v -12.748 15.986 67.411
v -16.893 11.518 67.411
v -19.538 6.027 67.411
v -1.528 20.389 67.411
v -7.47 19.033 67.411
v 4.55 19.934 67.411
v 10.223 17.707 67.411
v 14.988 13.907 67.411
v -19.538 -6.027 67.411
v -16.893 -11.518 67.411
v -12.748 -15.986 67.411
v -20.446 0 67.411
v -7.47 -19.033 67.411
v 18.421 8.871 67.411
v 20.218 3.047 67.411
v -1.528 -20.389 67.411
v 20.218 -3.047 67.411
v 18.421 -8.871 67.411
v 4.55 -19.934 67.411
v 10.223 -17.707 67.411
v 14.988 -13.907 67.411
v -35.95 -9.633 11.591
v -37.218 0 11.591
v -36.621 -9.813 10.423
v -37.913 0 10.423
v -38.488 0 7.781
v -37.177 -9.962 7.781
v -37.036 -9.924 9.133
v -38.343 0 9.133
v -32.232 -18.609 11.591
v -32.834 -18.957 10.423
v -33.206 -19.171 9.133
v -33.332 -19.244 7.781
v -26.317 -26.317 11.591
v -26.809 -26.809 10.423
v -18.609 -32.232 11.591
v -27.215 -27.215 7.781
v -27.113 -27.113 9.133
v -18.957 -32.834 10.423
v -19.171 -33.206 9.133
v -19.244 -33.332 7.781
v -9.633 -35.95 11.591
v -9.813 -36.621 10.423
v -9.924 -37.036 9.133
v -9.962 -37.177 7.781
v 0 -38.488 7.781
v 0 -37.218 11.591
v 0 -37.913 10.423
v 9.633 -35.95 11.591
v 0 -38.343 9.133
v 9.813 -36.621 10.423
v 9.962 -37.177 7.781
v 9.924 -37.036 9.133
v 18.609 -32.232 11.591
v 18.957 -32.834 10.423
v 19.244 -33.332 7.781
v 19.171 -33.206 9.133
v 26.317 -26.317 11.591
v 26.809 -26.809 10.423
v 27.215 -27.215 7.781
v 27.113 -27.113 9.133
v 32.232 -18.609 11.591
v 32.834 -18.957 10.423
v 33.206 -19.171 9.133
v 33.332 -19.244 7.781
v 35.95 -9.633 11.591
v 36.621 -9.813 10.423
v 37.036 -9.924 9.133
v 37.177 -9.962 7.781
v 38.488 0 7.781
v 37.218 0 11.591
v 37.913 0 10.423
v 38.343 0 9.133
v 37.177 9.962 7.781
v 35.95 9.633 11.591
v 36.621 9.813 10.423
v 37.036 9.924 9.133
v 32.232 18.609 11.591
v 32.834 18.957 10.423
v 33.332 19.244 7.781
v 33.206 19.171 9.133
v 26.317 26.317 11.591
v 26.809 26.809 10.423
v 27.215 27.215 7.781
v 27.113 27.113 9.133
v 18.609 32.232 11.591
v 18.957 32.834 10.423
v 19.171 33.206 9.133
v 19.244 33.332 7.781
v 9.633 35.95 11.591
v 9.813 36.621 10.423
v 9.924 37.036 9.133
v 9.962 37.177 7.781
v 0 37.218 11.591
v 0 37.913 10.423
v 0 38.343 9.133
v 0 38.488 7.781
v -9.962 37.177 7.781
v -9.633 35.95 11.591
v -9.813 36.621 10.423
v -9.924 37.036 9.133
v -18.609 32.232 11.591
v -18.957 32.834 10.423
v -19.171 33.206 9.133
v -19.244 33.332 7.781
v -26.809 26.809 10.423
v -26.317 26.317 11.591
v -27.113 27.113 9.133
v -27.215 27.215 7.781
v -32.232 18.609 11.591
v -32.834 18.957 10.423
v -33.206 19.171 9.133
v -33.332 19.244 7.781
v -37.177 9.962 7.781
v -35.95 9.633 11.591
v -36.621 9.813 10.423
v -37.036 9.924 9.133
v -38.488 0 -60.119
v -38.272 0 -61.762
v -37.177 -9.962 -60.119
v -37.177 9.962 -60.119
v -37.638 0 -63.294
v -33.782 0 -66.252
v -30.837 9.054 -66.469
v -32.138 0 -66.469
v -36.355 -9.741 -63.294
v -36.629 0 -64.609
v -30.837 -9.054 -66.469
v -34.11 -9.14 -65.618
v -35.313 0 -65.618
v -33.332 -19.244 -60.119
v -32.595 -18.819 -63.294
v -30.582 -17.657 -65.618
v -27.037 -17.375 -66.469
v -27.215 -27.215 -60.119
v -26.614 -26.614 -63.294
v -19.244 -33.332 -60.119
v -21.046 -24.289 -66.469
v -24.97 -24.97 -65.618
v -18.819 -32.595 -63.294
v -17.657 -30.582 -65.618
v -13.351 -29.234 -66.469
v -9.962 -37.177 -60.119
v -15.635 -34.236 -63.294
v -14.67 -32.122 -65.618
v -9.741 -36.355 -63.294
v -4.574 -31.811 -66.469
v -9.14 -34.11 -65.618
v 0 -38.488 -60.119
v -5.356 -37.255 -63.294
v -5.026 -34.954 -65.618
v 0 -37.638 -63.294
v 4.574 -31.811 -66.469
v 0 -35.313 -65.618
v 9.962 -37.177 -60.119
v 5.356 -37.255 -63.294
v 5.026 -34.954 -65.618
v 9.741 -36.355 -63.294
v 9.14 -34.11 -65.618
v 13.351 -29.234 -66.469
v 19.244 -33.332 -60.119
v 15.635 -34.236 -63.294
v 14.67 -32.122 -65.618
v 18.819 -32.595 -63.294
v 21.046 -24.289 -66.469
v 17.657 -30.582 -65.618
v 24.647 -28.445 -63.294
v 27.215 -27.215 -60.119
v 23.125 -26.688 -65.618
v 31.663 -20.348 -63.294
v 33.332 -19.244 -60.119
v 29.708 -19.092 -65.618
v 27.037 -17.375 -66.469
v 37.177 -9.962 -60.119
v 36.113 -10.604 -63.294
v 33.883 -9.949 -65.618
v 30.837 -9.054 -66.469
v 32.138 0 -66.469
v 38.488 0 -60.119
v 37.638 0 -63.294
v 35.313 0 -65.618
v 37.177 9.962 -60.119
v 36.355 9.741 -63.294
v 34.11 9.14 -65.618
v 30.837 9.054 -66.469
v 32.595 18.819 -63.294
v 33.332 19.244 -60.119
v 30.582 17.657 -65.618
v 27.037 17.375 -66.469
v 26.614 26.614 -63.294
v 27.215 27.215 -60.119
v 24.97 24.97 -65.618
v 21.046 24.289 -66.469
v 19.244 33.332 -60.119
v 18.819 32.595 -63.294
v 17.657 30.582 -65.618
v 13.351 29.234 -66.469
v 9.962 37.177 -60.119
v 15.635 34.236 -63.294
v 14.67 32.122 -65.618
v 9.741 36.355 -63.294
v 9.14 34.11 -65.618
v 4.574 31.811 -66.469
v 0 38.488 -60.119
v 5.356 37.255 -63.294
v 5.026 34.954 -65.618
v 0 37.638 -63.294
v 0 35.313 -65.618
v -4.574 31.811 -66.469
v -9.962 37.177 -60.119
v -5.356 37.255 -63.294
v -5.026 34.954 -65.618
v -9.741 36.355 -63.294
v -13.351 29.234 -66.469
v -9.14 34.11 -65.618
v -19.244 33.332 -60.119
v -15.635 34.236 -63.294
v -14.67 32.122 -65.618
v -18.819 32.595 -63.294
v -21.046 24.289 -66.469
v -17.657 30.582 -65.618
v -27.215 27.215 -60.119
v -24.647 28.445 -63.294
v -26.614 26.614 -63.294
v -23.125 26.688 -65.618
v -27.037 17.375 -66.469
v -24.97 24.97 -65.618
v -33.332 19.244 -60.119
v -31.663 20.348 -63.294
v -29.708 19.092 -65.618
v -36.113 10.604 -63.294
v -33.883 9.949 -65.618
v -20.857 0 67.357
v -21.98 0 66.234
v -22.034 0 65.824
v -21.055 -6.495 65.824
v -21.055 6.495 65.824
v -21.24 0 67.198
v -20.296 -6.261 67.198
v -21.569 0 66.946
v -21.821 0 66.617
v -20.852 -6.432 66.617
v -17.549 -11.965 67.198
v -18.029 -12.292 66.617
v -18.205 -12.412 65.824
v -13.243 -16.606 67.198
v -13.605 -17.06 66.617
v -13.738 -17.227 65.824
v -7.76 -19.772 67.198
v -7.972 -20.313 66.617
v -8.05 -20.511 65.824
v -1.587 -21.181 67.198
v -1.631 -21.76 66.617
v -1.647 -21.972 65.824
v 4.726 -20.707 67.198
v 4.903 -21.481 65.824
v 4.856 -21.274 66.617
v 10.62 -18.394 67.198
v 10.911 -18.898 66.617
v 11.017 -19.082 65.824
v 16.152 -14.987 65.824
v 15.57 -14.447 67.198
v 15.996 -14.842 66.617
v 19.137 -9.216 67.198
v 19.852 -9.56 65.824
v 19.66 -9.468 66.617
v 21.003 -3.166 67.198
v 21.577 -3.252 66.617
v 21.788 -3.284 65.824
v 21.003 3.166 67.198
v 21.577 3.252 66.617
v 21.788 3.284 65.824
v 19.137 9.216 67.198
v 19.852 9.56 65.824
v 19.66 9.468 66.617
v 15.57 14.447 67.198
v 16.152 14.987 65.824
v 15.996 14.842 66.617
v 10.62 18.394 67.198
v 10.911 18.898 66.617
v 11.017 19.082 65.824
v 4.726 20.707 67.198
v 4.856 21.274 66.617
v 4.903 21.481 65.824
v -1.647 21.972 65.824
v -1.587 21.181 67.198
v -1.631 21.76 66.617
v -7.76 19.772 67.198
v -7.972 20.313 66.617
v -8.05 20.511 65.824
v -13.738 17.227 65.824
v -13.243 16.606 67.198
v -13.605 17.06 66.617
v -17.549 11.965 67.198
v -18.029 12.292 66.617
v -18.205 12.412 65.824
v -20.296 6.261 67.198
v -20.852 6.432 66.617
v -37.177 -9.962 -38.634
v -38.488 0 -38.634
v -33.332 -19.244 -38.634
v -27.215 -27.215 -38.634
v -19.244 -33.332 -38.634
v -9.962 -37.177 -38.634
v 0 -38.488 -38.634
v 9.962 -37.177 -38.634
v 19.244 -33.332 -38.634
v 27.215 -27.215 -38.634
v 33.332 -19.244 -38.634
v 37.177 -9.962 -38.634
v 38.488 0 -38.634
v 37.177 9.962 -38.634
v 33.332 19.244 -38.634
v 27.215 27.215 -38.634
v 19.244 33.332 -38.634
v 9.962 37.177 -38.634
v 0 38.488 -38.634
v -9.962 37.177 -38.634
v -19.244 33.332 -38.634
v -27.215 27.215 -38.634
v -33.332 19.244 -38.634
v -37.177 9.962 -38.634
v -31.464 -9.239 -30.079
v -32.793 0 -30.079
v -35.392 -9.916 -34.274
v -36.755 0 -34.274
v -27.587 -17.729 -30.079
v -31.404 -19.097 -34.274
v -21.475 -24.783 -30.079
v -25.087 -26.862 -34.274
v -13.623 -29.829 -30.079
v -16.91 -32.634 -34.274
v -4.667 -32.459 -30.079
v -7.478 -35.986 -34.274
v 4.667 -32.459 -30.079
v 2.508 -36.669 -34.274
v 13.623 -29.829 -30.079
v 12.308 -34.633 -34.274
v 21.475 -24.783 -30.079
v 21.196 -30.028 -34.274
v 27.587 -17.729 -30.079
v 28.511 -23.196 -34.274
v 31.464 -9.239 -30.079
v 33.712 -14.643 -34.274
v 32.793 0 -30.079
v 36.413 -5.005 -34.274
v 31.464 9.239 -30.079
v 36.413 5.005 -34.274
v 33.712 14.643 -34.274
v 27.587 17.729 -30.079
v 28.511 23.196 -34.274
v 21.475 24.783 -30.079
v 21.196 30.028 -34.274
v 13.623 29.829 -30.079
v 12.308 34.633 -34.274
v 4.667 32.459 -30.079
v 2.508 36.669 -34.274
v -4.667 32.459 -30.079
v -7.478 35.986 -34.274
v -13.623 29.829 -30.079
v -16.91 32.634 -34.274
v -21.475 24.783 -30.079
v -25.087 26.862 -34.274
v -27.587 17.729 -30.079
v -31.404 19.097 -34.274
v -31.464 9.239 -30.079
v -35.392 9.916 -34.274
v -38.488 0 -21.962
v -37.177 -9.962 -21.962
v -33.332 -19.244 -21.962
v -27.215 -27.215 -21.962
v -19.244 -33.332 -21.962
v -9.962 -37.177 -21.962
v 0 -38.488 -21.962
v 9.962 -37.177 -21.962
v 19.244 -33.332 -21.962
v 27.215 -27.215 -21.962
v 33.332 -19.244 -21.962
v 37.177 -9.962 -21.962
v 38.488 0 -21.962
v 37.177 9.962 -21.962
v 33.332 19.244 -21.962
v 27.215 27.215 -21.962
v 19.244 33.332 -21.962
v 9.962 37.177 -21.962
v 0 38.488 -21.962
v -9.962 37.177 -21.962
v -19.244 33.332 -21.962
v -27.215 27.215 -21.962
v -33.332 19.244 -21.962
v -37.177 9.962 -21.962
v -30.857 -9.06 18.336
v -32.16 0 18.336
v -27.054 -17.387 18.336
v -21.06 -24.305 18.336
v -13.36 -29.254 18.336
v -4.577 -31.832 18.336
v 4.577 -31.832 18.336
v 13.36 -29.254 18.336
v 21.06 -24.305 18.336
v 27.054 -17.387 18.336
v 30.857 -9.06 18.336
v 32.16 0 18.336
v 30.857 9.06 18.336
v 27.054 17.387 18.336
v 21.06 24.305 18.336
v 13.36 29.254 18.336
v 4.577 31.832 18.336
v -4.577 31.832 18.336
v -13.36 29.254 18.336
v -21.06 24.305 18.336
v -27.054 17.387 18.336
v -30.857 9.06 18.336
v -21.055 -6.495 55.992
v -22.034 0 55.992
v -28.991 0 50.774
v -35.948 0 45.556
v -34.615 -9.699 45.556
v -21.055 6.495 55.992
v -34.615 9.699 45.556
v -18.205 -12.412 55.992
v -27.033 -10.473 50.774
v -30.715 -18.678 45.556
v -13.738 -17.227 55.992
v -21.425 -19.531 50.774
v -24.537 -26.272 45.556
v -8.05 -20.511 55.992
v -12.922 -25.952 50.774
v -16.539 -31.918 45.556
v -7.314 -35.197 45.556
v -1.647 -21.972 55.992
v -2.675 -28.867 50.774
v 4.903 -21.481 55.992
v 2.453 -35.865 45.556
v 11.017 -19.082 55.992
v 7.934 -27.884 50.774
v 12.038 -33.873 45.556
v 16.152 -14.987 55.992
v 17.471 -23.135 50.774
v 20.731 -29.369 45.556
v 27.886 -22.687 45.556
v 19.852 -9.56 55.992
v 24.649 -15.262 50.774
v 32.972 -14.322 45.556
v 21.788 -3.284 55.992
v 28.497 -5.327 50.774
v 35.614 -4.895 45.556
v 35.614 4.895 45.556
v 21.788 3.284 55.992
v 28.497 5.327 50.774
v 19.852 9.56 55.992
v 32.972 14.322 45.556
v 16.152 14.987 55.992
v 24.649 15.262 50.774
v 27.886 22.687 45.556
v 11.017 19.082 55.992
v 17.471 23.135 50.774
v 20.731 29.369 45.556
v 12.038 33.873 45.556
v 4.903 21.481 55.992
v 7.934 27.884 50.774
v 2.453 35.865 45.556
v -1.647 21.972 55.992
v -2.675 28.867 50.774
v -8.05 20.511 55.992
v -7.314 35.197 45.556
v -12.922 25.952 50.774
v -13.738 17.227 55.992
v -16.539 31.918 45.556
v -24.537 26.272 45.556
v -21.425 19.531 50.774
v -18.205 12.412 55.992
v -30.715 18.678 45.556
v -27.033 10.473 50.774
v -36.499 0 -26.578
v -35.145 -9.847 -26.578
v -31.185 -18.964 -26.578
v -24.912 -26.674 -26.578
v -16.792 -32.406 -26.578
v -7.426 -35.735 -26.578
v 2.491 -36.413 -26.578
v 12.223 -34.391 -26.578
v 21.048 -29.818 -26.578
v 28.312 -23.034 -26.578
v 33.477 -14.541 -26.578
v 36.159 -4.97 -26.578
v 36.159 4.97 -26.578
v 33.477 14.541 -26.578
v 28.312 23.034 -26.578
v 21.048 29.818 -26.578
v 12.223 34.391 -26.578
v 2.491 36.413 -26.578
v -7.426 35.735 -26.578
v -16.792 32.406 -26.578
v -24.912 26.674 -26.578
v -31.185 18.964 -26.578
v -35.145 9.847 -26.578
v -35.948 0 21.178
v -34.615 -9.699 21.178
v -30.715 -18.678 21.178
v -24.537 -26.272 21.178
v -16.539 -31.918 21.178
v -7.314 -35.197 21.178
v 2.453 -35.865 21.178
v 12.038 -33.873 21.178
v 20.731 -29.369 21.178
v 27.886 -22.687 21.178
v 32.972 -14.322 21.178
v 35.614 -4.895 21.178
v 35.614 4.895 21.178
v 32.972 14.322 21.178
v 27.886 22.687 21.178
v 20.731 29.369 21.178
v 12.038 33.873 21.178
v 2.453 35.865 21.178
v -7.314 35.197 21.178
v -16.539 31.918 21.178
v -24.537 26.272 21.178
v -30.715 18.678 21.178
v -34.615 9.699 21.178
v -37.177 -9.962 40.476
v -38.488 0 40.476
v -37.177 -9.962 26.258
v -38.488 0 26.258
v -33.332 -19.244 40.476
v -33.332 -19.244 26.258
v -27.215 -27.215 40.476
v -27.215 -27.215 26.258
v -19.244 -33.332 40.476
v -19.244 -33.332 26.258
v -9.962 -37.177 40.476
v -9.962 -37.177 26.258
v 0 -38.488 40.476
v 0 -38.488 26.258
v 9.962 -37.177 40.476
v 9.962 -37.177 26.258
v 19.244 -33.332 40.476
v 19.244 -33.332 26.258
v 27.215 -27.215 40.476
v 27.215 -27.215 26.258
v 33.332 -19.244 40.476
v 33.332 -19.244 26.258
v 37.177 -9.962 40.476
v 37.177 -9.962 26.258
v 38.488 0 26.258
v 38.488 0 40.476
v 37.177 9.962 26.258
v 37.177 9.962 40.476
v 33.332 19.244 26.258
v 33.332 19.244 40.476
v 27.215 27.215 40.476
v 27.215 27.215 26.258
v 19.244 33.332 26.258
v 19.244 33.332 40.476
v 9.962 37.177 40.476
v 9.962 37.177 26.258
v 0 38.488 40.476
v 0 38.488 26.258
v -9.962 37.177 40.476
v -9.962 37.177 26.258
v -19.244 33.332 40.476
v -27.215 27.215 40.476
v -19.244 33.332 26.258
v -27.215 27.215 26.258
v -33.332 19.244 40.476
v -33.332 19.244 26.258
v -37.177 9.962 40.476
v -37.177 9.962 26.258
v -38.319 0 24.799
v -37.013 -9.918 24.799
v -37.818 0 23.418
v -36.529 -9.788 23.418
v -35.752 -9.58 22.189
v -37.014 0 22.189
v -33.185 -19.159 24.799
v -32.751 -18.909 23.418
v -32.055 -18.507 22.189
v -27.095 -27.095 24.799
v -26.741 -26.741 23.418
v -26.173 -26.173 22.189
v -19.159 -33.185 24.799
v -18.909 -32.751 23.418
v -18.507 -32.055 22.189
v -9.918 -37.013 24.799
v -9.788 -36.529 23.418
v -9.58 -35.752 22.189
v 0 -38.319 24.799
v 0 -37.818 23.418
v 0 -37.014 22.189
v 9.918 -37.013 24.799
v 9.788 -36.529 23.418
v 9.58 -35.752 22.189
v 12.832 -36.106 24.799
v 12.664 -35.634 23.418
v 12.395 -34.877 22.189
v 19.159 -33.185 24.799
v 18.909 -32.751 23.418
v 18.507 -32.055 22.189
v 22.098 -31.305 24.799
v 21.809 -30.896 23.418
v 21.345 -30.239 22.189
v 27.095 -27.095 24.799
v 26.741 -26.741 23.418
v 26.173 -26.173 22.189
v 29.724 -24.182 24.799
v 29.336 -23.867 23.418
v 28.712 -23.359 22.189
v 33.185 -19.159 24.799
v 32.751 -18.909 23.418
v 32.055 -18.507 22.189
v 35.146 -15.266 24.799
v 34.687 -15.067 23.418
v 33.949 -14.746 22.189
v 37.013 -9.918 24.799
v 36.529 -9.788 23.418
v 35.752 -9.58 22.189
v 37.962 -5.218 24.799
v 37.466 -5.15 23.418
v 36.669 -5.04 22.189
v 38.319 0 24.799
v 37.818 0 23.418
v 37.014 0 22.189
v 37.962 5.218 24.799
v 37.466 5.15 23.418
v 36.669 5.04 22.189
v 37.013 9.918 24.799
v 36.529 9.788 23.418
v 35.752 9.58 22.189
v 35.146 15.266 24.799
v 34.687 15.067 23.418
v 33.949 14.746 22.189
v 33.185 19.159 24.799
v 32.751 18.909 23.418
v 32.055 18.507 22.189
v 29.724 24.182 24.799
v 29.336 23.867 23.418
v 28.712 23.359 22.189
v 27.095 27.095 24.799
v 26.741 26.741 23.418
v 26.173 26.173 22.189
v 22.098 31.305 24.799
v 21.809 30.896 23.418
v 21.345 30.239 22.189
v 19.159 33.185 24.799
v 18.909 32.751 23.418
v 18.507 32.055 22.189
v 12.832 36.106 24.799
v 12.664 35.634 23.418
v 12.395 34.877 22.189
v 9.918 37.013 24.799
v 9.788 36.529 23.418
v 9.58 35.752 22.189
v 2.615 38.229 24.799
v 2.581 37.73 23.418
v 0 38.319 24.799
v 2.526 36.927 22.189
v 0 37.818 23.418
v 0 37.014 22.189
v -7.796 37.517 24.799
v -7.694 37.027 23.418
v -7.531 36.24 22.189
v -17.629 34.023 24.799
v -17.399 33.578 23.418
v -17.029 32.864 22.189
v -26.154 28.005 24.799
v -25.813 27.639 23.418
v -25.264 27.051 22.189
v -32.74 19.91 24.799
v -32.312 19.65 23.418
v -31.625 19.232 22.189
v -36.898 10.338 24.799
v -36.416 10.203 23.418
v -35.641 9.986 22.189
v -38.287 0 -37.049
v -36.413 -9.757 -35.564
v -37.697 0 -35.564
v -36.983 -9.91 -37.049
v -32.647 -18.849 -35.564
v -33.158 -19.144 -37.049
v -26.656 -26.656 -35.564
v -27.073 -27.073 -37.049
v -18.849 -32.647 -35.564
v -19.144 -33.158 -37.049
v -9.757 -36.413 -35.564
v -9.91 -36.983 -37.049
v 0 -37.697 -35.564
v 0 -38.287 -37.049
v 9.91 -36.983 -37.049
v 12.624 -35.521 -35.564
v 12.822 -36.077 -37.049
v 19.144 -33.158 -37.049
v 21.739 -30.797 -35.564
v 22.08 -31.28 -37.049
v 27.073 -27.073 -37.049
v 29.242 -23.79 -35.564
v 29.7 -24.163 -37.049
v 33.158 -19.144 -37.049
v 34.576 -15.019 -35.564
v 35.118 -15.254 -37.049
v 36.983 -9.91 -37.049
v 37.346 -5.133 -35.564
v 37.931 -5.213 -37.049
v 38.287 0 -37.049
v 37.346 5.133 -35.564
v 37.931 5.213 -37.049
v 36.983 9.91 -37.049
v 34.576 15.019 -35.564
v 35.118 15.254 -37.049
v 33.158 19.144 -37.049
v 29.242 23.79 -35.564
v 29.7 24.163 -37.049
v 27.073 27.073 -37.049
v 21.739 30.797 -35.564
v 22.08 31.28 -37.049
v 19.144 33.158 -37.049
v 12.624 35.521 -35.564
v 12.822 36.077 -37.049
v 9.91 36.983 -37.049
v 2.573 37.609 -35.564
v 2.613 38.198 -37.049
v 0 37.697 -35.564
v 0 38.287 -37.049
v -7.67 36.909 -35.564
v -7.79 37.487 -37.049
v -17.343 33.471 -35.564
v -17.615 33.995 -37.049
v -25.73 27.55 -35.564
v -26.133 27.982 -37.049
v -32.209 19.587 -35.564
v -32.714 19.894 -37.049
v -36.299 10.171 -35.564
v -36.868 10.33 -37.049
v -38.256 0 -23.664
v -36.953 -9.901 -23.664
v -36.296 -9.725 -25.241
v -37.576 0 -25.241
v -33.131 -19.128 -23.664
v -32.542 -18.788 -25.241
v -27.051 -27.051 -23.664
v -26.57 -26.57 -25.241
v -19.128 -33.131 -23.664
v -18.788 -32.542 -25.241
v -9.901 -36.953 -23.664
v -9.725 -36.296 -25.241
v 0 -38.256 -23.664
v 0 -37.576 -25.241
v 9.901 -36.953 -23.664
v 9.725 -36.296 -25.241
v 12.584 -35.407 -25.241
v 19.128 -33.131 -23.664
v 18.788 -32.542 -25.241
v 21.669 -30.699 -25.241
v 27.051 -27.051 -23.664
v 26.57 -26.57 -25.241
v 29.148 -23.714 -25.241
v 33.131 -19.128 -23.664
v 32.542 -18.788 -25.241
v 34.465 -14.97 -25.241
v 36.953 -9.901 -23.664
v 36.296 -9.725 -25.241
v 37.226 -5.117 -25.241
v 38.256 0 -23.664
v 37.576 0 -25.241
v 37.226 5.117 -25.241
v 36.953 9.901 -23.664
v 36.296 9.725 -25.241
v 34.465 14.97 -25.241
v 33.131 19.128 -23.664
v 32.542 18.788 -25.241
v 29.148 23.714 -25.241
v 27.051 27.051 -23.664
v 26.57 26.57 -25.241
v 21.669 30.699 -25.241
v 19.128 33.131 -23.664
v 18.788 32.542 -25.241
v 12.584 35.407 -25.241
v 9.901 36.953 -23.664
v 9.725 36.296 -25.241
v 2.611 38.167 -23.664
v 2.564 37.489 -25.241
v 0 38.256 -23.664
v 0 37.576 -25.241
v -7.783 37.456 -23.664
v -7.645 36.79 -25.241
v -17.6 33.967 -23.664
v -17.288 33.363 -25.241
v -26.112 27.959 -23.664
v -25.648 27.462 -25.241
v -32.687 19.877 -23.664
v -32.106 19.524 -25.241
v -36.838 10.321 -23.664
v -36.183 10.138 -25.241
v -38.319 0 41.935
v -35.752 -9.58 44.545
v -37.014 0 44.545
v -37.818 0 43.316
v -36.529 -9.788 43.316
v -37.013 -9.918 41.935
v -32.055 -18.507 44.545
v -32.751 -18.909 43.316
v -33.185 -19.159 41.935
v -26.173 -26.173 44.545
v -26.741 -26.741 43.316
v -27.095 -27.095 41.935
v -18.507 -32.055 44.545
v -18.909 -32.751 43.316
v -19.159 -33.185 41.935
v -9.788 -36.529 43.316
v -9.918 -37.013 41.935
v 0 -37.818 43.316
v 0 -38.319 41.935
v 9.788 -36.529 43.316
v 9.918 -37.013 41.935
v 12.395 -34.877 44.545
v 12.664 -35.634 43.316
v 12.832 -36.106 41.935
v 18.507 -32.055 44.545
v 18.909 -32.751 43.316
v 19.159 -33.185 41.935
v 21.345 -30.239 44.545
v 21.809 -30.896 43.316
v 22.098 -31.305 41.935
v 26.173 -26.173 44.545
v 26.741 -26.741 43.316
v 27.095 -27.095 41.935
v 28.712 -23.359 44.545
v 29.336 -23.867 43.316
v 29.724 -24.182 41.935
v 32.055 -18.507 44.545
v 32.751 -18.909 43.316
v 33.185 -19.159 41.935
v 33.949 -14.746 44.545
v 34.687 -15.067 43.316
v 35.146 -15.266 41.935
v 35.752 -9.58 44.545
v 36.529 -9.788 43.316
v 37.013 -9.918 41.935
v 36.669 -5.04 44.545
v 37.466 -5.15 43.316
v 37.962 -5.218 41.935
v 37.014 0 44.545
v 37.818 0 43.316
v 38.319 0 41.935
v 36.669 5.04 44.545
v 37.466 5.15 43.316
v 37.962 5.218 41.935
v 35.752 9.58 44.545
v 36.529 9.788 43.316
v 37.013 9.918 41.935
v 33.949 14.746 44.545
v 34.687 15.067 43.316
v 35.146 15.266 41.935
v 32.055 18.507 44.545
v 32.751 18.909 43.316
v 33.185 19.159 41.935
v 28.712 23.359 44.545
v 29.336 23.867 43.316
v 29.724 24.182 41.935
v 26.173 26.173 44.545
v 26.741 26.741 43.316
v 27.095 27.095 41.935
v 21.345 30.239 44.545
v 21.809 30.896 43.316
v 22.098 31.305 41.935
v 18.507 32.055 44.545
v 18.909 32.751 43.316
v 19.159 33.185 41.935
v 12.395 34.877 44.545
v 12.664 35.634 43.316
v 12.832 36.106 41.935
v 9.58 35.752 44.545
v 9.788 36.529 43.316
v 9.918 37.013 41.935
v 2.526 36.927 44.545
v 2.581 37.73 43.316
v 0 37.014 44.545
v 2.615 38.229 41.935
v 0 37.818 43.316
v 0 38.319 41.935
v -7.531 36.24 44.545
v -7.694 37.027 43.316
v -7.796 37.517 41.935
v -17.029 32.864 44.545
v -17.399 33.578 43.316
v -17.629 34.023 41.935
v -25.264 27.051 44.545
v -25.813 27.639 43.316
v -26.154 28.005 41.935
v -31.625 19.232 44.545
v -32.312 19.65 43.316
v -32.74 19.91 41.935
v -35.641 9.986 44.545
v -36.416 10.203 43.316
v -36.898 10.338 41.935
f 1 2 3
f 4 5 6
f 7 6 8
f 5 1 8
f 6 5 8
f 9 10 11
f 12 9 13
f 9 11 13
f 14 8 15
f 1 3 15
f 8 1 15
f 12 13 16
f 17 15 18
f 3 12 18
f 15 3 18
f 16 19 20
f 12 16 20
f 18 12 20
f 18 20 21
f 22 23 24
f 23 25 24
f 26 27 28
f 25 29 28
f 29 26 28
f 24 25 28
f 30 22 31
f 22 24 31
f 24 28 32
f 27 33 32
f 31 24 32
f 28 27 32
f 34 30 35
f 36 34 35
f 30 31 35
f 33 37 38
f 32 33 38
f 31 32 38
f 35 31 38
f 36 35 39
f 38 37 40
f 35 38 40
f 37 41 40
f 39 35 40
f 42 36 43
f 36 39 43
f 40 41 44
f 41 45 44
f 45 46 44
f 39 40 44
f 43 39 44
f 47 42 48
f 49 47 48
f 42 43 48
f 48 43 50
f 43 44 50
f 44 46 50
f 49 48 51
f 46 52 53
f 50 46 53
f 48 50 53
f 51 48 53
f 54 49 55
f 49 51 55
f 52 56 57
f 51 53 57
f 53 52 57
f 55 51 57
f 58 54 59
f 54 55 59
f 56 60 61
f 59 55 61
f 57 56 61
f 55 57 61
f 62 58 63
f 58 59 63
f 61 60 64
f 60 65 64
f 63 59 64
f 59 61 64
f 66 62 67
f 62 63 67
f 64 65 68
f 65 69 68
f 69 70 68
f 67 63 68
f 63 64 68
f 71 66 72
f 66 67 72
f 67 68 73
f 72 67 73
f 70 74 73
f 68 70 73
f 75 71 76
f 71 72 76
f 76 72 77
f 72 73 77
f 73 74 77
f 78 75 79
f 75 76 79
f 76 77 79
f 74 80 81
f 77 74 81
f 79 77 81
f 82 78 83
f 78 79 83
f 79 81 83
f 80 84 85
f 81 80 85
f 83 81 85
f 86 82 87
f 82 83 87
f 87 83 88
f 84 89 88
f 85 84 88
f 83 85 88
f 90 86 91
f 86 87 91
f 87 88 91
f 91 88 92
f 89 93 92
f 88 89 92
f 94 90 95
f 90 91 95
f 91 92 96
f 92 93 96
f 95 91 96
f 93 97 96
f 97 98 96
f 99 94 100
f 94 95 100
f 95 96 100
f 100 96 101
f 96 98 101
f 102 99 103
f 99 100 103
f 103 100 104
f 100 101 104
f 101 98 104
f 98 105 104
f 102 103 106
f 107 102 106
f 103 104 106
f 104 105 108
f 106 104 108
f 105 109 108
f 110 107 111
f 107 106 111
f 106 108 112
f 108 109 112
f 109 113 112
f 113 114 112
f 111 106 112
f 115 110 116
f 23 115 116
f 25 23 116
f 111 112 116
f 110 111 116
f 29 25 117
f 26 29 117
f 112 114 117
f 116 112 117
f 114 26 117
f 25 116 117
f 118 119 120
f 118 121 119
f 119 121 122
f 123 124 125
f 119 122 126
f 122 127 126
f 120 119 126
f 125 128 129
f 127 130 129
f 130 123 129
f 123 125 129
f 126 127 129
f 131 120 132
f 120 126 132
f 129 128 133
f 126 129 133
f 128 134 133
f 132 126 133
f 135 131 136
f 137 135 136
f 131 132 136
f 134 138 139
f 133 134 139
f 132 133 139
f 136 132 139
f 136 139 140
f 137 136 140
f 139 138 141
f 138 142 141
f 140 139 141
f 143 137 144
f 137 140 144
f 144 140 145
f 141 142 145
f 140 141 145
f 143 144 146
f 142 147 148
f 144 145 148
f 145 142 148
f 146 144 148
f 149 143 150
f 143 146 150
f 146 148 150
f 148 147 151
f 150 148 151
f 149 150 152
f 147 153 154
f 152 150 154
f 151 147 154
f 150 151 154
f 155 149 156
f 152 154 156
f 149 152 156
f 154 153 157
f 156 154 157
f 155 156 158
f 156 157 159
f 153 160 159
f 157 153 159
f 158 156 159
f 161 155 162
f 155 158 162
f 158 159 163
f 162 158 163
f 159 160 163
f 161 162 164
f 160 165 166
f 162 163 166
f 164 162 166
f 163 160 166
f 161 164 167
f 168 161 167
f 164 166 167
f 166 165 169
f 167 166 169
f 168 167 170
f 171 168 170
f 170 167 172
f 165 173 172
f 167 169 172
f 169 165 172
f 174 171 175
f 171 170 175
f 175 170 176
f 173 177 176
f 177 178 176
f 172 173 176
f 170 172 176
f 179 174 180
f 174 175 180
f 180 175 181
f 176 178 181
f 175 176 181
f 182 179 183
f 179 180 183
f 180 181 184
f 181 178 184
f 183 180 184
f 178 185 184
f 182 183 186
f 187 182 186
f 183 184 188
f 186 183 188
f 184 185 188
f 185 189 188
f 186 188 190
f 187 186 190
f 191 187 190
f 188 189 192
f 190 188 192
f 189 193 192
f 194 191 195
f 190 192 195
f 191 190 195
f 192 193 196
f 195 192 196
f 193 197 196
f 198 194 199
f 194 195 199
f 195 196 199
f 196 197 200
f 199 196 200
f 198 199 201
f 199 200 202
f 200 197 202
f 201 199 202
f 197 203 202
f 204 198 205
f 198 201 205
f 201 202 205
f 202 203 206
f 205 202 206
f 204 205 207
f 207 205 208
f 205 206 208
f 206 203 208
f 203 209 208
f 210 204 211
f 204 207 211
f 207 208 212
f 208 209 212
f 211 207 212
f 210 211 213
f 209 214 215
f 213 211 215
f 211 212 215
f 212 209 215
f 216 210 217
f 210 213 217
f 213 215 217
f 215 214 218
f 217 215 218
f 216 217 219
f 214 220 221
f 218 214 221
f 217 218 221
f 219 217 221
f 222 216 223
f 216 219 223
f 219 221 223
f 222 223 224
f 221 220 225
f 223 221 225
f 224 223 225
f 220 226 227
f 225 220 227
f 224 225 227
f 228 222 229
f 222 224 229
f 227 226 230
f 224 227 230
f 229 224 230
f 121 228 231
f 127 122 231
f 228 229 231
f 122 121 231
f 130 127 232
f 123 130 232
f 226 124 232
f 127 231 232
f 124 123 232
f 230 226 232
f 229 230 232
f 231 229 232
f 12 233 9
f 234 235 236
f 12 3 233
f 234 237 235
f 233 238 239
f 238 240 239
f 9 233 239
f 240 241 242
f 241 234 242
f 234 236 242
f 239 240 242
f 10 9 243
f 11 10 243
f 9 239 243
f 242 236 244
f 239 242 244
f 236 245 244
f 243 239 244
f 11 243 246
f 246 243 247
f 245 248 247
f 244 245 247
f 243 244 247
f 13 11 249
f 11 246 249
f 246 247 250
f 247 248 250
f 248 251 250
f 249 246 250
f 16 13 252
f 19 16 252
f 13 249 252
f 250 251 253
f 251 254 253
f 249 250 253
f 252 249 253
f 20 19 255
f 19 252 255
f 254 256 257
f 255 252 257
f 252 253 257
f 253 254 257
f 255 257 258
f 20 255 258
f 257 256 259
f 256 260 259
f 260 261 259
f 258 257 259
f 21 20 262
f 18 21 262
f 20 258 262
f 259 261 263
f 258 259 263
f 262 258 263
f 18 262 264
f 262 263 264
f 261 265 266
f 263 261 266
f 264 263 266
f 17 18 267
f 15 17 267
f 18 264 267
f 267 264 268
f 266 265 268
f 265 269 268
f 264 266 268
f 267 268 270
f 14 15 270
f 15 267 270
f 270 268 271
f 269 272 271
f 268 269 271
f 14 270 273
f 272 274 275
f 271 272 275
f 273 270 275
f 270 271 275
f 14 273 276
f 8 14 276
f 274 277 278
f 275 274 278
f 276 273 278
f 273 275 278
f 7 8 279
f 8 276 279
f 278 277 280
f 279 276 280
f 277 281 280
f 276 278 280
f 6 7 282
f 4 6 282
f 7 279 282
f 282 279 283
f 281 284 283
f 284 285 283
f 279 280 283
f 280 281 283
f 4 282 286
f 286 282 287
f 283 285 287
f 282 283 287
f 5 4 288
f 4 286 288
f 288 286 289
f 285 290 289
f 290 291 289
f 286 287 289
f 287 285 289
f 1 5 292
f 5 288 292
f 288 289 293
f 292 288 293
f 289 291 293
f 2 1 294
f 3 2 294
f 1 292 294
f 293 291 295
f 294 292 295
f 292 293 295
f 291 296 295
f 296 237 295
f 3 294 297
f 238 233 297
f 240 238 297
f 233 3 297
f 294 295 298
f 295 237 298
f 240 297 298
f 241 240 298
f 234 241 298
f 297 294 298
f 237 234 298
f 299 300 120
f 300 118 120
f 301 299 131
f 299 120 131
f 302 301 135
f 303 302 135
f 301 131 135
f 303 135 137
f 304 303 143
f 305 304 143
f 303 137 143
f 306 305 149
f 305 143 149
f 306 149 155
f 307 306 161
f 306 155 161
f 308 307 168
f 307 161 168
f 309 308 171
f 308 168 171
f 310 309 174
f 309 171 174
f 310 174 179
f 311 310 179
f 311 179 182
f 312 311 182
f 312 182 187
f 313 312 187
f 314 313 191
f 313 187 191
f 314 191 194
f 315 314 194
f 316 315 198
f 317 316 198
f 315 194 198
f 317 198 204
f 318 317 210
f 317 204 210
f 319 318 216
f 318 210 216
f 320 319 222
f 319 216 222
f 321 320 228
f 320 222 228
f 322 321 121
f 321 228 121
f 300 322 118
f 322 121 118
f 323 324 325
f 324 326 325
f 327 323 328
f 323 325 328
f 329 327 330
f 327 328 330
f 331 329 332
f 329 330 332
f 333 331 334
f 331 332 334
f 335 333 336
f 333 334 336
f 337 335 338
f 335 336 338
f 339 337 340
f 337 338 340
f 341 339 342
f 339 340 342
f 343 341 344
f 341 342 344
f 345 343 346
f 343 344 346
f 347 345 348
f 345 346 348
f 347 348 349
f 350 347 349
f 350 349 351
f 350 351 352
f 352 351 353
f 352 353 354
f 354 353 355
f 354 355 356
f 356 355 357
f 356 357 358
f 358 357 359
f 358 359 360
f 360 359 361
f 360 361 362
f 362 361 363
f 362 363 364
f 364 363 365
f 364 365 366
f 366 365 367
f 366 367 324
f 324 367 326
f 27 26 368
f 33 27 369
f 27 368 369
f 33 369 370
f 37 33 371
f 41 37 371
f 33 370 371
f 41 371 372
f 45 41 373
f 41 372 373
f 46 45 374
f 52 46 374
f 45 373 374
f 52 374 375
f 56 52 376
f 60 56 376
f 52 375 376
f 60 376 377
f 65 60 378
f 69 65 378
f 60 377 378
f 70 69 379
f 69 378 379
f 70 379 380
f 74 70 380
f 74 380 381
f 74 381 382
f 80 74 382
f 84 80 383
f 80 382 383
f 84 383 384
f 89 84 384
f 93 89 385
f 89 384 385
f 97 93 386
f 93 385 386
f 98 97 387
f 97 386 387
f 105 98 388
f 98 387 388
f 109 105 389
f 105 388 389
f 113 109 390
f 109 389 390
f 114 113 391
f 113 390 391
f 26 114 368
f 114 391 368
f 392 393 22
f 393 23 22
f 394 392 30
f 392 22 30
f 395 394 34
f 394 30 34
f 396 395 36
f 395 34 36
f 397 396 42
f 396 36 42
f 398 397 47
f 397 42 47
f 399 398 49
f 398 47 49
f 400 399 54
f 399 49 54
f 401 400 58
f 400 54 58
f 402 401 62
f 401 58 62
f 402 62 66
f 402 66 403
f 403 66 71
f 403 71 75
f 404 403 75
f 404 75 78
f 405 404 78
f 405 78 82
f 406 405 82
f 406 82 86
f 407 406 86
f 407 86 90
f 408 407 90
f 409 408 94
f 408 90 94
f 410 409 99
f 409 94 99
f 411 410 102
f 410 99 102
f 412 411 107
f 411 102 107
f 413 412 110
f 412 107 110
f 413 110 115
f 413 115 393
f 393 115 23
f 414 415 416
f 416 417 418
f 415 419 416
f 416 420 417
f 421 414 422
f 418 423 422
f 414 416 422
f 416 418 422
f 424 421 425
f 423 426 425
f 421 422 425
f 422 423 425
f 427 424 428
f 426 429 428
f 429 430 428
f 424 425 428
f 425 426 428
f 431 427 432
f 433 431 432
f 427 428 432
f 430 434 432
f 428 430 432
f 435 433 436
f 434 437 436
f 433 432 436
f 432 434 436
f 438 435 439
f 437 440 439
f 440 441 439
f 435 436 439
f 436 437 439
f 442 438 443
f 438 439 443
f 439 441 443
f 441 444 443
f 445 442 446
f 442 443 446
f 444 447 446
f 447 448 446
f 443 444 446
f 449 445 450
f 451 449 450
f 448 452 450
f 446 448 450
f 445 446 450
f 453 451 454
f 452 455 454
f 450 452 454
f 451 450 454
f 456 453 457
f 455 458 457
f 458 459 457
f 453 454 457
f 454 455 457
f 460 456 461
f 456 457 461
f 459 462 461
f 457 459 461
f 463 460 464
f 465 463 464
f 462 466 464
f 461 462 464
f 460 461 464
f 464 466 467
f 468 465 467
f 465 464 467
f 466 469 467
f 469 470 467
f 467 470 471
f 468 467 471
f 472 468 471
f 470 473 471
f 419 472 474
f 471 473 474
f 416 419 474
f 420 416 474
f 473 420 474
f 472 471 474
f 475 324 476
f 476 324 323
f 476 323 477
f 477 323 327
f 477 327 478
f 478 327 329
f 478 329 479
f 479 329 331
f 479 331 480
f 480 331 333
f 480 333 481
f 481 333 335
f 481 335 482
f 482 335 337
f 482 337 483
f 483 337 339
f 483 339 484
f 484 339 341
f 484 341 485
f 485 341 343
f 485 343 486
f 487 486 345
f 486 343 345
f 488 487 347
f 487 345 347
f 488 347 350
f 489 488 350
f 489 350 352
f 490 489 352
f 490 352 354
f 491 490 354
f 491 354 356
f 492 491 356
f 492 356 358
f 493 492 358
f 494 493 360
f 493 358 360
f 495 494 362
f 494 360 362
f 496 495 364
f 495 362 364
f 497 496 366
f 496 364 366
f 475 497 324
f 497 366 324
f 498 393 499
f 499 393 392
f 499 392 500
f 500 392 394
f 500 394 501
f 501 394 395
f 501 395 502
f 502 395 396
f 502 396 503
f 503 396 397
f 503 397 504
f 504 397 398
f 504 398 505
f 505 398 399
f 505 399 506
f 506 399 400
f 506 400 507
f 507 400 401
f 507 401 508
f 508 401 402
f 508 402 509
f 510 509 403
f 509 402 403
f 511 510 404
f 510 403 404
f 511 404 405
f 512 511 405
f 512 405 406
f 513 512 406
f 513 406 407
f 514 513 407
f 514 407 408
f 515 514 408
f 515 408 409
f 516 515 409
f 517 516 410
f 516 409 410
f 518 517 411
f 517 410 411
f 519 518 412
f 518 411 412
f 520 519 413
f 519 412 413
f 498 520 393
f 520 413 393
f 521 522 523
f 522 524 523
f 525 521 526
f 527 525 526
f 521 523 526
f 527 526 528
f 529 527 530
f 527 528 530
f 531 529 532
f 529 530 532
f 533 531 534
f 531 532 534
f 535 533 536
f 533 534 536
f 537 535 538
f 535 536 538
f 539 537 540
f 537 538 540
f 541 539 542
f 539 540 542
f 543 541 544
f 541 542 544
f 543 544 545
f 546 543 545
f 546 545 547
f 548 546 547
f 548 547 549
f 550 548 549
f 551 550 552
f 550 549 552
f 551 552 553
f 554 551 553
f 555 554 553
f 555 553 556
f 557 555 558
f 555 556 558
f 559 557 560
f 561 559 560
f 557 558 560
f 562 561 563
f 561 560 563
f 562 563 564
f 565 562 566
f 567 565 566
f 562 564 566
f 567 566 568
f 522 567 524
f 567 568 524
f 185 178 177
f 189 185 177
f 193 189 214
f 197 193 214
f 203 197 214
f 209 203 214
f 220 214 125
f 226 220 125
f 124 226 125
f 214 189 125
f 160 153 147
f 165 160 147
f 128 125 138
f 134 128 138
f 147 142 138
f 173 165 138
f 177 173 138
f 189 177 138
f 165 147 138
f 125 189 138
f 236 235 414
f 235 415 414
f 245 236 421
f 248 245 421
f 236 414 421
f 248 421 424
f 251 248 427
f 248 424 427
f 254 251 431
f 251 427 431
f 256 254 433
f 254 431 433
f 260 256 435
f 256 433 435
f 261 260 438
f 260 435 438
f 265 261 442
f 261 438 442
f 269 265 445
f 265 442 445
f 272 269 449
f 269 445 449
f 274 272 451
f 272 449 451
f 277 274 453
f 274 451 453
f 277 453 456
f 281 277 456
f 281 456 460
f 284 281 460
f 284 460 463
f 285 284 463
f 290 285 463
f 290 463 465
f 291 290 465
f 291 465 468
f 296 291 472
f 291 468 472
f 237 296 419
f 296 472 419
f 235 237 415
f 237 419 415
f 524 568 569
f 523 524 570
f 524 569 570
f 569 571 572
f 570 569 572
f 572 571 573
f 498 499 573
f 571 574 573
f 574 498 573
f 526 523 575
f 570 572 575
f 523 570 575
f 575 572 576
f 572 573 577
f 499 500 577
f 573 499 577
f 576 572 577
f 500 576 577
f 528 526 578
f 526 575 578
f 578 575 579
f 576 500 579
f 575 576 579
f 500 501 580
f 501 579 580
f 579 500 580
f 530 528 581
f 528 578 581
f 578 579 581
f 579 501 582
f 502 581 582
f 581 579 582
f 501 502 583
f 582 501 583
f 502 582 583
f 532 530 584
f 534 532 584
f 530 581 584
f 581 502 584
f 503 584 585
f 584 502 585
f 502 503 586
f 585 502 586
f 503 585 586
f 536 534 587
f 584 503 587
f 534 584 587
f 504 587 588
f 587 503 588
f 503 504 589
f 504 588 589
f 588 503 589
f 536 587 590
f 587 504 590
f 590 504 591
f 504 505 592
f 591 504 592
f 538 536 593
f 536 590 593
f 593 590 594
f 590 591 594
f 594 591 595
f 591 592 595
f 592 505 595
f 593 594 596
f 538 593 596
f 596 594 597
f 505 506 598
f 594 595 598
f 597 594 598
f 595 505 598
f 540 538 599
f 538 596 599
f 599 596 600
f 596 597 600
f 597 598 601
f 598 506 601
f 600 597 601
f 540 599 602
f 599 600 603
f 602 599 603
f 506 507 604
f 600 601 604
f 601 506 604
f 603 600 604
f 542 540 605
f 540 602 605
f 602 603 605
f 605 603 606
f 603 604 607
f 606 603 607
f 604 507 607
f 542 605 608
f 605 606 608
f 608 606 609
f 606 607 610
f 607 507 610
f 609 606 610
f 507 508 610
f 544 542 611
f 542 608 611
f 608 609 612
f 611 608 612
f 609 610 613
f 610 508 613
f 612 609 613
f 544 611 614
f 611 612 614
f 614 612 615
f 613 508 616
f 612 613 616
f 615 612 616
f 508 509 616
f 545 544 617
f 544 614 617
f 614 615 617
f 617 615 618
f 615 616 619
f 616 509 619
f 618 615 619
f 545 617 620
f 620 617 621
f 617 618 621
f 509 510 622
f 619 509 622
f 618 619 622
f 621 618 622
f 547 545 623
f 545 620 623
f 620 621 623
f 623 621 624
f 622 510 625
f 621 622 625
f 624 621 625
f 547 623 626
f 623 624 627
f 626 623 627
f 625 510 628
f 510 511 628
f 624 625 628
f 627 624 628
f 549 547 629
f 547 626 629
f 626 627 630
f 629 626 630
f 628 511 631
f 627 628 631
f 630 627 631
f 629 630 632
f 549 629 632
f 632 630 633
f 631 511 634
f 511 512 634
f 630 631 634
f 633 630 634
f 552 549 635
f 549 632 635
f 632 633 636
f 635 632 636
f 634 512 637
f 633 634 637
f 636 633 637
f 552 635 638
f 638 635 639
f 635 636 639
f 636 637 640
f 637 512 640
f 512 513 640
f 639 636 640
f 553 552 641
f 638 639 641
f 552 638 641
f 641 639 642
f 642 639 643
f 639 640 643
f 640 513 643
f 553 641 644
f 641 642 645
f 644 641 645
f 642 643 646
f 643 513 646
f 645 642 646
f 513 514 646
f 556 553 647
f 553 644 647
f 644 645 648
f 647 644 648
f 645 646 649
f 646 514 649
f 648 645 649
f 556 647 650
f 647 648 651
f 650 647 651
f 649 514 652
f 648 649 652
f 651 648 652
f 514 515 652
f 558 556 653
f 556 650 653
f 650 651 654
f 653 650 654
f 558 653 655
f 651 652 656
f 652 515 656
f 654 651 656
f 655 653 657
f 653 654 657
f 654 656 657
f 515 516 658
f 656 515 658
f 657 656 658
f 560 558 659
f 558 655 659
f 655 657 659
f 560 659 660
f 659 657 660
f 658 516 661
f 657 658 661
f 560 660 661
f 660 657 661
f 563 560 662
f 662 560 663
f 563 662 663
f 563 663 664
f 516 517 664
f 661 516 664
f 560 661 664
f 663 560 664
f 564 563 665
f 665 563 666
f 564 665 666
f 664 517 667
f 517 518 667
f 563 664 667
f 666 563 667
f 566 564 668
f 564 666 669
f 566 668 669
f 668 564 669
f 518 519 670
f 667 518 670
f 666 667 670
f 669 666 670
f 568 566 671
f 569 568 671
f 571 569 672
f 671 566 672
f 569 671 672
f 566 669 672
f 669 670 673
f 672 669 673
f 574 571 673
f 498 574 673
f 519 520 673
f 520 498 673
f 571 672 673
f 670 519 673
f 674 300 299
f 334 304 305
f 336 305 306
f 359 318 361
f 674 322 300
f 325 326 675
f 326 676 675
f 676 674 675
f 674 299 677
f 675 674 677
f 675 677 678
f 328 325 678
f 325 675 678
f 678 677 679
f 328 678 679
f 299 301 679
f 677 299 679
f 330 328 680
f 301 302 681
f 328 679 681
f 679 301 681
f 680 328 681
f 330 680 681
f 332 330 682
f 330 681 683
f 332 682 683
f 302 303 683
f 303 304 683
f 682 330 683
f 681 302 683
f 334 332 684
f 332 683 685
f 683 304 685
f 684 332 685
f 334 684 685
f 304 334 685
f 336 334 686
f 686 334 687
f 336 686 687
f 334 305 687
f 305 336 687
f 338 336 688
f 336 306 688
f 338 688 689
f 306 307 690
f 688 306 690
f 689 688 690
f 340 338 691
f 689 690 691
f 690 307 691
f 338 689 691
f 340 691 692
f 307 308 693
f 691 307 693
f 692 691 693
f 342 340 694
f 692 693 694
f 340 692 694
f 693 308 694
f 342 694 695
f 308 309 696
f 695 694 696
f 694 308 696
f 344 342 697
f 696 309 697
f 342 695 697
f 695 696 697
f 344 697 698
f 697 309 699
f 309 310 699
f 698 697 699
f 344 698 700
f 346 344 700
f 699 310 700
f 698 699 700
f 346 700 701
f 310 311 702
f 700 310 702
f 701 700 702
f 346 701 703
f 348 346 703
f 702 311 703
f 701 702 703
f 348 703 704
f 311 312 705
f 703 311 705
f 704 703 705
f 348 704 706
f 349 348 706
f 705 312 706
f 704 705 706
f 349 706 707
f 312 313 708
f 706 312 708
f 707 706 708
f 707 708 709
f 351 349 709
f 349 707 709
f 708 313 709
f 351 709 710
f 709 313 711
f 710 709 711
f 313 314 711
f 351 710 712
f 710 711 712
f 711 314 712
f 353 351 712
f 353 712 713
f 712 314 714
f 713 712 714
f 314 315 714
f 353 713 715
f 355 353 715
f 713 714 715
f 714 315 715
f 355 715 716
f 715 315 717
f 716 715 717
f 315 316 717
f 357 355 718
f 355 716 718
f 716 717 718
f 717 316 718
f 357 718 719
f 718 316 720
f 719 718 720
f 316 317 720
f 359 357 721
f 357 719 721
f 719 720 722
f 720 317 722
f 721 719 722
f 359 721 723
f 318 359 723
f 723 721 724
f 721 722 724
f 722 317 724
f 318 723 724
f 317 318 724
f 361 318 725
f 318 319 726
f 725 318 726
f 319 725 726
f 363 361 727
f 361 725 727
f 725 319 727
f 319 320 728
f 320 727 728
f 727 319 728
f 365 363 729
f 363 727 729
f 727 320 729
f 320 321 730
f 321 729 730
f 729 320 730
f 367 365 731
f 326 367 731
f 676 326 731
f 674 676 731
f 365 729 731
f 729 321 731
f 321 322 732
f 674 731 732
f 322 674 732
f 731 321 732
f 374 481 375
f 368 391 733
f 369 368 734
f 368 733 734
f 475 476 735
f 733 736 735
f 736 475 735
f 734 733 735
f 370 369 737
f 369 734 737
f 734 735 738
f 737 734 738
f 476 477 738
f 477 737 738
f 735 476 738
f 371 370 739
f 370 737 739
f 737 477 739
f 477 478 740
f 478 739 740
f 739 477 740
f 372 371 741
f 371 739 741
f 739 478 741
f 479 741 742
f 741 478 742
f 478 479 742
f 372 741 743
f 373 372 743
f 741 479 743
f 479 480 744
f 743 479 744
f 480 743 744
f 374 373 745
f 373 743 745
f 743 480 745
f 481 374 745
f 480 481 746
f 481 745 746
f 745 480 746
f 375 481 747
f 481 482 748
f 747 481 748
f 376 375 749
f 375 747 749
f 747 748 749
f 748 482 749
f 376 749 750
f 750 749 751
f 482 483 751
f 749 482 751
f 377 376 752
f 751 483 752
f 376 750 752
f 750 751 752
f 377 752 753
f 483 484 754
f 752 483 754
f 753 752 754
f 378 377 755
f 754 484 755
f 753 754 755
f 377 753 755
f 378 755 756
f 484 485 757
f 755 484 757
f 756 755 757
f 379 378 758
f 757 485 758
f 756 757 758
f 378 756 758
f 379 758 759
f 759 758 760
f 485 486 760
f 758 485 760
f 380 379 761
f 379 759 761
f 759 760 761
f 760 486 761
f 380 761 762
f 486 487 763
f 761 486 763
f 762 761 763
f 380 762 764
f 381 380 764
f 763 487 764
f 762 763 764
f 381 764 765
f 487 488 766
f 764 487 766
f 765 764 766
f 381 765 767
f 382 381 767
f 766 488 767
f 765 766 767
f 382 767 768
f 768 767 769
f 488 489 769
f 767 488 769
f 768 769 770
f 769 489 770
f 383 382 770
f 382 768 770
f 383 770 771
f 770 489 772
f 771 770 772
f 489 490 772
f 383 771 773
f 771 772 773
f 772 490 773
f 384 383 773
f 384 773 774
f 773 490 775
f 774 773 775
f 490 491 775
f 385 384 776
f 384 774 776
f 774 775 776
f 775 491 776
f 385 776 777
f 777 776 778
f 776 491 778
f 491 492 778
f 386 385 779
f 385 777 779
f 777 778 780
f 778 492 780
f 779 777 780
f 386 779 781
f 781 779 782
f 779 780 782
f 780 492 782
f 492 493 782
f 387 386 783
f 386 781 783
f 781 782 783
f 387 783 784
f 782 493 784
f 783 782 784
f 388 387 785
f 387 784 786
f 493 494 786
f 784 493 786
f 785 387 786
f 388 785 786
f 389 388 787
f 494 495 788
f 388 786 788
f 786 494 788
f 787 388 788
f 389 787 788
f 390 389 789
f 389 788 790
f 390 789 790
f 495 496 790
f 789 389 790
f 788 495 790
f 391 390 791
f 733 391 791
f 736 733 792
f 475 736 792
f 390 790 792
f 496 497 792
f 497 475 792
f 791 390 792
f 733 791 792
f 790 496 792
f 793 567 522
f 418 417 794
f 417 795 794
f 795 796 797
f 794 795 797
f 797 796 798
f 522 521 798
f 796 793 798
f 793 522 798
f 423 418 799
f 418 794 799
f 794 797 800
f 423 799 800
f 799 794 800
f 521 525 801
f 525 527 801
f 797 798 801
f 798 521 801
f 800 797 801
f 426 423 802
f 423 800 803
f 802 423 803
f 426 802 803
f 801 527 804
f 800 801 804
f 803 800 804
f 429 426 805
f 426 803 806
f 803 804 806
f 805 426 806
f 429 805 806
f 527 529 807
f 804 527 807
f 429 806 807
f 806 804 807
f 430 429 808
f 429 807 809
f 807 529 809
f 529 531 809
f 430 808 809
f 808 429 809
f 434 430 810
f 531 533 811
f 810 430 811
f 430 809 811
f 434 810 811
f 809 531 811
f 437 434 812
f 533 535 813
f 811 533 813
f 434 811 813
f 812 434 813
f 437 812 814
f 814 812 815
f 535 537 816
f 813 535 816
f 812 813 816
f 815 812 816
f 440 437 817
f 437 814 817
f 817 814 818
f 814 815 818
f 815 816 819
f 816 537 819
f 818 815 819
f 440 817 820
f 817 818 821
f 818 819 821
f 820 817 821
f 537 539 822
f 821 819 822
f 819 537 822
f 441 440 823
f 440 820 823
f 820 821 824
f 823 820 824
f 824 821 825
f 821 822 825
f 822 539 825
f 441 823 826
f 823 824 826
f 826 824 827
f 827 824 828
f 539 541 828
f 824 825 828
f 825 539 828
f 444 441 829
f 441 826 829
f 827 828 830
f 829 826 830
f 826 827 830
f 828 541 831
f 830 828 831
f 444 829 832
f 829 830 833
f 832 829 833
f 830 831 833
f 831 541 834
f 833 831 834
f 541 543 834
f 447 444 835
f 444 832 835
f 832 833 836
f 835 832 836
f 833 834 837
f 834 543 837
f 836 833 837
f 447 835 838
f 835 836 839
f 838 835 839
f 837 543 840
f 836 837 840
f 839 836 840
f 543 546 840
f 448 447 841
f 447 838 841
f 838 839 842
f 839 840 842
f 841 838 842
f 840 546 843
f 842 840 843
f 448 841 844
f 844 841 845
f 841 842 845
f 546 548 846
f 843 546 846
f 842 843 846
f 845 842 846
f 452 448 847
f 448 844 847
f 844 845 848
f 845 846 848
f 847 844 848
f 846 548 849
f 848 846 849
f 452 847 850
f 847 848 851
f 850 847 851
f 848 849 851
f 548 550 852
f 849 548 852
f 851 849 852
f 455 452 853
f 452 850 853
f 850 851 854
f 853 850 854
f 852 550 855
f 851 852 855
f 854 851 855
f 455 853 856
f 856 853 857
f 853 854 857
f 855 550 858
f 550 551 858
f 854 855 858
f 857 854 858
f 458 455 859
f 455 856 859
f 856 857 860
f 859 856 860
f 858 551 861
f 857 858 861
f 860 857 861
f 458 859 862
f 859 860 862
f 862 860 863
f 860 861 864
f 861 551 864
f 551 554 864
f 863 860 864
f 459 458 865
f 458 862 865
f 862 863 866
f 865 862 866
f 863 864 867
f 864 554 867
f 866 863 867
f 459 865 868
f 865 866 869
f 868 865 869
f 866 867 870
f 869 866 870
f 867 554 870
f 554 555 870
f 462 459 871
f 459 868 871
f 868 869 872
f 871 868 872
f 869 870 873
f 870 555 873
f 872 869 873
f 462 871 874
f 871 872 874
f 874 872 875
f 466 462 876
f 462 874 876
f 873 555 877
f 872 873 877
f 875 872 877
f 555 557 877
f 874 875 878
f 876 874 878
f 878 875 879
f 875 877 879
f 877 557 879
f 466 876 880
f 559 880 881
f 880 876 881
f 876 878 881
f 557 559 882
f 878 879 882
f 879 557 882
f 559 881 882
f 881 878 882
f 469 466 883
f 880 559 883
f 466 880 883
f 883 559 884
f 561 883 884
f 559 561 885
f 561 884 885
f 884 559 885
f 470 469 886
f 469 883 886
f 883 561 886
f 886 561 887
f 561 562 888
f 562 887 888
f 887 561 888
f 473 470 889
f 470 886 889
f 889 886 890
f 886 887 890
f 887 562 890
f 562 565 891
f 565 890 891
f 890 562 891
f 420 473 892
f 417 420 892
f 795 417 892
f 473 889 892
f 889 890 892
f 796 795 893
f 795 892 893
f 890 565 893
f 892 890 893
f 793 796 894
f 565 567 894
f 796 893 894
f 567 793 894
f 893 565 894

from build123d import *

# Parameters (mm, degrees)
F2_DEPTH = 12.7
F1_R     = 22.5055590266
F3_DEPTH = 7.62
F4_W     = 30.1420278847
F4_H     = 17.9640296847
F5_DEPTH = 2.54
F7_DEPTH = 1.27


with BuildPart() as f2:
    # F0 (on Front) → F2 (new body)
    with BuildSketch(Plane.XZ):
        Polygon((16.1803662777, 0), (37.0746999979, 0), (37.0746999979, 26.1179152876), (34.0169928968, 32.2333276272), (31.2140900642, 39.1131713986), (31.2140900642, 43.4449203312), (21.7861626297, 43.4449203312), (21.7861626297, 39.1131713986), (18.7284555286, 32.2333276272), (16.1803662777, 26.1179152876), align=None)
    extrude(amount=F2_DEPTH)


with BuildPart() as f3:
    # F1 (on Front) → F3 (new body)
    with BuildSketch(Plane.XZ):
        with Locations((78.2617554069, 32.2333276272)):
            Circle(F1_R)
    extrude(amount=F3_DEPTH)


with BuildPart() as f5:
    # F4 (on Top) → F5 (new body)
    with BuildSketch(Plane.XY):
        with Locations((-15.0710139424, 8.9820148423)):
            Rectangle(F4_W, F4_H)
    extrude(amount=F5_DEPTH)

    # F6 (on face) → F7 (join)
    with BuildSketch(Plane.XY.offset(2.54)):
        Polygon((-35.7478260994, 4.4591561891), (-30.1420278847, 2.4206847884), (0, 2.4206847884), (2.9831291176, 2.4206847884), (5.0216042437, 4.4591561891), (5.0216042437, 7.2620538995), (2.9831291176, 7.2620538995), (0, 7.2620538995), (-30.1420278847, 7.2620538995), (-32.6901189983, 7.2620538995), (-35.7478260994, 7.2620538995), align=None)
        Polygon((-30.1420278847, 11.8486145511), (0, 11.8486145511), (2.9831291176, 11.8486145511), (5.0216042437, 14.396703802), (0, 14.396703802), (-30.1420278847, 14.396703802), (-32.6901189983, 14.396703802), (-32.6901189983, 11.8486145511), align=None)
    extrude(amount=F7_DEPTH)


with BuildPart() as f12:
    # F11 (on Front) → F12 (revolve)
    with BuildSketch(Plane.XZ):
        with BuildLine():
            Line((0, -66.4687156677), (0, 55.9921823442))
            Line((0, 55.9921823442), (-22.0337584615, 55.9921823442))
            Line((-22.0337584615, 55.9921823442), (-35.9484543807, 45.556163555))
            ThreePointArc((-35.9484543807, 45.556163555), (-37.8180675739, 43.3159697459), (-38.4884551167, 40.476163003))
            Line((-38.4884551167, 40.476163003), (-38.4884551167, 26.2577953691))
            ThreePointArc((-38.4884551167, 26.2577953691), (-37.8180675121, 23.4179885028), (-35.9484541599, 21.1777946515))
            Line((-35.9484541599, 21.1777946515), (-32.1597233415, 18.3362476528))
            Line((-32.1597233415, 18.3362476528), (-37.2184558344, 11.5912683486))
            ThreePointArc((-37.2184558344, 11.5912683486), (-38.1625942485, 9.7893150524), (-38.4884551167, 7.7812693055))
            Line((-38.4884551167, 7.7812693055), (-38.4884551167, -21.9619643911))
            ThreePointArc((-38.4884551167, -21.9619643911), (-37.9697873011, -24.47554052), (-36.4985133985, -26.5784989984))
            Line((-36.4985133985, -26.5784989984), (-32.7925980091, -30.0785284489))
            Line((-32.7925980091, -30.0785284489), (-36.754989724, -34.2740041277))
            ThreePointArc((-36.754989724, -34.2740041277), (-38.0391963734, -36.2880546043), (-38.4884551167, -38.6340624095))
            Line((-38.4884551167, -38.6340624095), (-38.4884551167, -60.1187156677))
            ThreePointArc((-38.4884551167, -60.1187156677), (-36.6285831773, -64.6088437283), (-32.1384551167, -66.4687156677))
            Line((-32.1384551167, -66.4687156677), (0, -66.4687156677))
        make_face()
        with BuildLine():
            Line((0, 55.9921823442), (0, 67.4110209227))
            Line((0, 67.4110209227), (-20.4462584615, 67.4110209227))
            ThreePointArc((-20.4462584615, 67.4110209227), (-21.5687904766, 66.9460529378), (-22.0337584615, 65.8235209227))
            Line((-22.0337584615, 65.8235209227), (-22.0337584615, 55.9921823442))
            Line((-22.0337584615, 55.9921823442), (0, 55.9921823442))
        make_face()
    revolve(axis=Axis((0, 0, 0.4711526275), (0, 0, 1)))


solid = f12.part
